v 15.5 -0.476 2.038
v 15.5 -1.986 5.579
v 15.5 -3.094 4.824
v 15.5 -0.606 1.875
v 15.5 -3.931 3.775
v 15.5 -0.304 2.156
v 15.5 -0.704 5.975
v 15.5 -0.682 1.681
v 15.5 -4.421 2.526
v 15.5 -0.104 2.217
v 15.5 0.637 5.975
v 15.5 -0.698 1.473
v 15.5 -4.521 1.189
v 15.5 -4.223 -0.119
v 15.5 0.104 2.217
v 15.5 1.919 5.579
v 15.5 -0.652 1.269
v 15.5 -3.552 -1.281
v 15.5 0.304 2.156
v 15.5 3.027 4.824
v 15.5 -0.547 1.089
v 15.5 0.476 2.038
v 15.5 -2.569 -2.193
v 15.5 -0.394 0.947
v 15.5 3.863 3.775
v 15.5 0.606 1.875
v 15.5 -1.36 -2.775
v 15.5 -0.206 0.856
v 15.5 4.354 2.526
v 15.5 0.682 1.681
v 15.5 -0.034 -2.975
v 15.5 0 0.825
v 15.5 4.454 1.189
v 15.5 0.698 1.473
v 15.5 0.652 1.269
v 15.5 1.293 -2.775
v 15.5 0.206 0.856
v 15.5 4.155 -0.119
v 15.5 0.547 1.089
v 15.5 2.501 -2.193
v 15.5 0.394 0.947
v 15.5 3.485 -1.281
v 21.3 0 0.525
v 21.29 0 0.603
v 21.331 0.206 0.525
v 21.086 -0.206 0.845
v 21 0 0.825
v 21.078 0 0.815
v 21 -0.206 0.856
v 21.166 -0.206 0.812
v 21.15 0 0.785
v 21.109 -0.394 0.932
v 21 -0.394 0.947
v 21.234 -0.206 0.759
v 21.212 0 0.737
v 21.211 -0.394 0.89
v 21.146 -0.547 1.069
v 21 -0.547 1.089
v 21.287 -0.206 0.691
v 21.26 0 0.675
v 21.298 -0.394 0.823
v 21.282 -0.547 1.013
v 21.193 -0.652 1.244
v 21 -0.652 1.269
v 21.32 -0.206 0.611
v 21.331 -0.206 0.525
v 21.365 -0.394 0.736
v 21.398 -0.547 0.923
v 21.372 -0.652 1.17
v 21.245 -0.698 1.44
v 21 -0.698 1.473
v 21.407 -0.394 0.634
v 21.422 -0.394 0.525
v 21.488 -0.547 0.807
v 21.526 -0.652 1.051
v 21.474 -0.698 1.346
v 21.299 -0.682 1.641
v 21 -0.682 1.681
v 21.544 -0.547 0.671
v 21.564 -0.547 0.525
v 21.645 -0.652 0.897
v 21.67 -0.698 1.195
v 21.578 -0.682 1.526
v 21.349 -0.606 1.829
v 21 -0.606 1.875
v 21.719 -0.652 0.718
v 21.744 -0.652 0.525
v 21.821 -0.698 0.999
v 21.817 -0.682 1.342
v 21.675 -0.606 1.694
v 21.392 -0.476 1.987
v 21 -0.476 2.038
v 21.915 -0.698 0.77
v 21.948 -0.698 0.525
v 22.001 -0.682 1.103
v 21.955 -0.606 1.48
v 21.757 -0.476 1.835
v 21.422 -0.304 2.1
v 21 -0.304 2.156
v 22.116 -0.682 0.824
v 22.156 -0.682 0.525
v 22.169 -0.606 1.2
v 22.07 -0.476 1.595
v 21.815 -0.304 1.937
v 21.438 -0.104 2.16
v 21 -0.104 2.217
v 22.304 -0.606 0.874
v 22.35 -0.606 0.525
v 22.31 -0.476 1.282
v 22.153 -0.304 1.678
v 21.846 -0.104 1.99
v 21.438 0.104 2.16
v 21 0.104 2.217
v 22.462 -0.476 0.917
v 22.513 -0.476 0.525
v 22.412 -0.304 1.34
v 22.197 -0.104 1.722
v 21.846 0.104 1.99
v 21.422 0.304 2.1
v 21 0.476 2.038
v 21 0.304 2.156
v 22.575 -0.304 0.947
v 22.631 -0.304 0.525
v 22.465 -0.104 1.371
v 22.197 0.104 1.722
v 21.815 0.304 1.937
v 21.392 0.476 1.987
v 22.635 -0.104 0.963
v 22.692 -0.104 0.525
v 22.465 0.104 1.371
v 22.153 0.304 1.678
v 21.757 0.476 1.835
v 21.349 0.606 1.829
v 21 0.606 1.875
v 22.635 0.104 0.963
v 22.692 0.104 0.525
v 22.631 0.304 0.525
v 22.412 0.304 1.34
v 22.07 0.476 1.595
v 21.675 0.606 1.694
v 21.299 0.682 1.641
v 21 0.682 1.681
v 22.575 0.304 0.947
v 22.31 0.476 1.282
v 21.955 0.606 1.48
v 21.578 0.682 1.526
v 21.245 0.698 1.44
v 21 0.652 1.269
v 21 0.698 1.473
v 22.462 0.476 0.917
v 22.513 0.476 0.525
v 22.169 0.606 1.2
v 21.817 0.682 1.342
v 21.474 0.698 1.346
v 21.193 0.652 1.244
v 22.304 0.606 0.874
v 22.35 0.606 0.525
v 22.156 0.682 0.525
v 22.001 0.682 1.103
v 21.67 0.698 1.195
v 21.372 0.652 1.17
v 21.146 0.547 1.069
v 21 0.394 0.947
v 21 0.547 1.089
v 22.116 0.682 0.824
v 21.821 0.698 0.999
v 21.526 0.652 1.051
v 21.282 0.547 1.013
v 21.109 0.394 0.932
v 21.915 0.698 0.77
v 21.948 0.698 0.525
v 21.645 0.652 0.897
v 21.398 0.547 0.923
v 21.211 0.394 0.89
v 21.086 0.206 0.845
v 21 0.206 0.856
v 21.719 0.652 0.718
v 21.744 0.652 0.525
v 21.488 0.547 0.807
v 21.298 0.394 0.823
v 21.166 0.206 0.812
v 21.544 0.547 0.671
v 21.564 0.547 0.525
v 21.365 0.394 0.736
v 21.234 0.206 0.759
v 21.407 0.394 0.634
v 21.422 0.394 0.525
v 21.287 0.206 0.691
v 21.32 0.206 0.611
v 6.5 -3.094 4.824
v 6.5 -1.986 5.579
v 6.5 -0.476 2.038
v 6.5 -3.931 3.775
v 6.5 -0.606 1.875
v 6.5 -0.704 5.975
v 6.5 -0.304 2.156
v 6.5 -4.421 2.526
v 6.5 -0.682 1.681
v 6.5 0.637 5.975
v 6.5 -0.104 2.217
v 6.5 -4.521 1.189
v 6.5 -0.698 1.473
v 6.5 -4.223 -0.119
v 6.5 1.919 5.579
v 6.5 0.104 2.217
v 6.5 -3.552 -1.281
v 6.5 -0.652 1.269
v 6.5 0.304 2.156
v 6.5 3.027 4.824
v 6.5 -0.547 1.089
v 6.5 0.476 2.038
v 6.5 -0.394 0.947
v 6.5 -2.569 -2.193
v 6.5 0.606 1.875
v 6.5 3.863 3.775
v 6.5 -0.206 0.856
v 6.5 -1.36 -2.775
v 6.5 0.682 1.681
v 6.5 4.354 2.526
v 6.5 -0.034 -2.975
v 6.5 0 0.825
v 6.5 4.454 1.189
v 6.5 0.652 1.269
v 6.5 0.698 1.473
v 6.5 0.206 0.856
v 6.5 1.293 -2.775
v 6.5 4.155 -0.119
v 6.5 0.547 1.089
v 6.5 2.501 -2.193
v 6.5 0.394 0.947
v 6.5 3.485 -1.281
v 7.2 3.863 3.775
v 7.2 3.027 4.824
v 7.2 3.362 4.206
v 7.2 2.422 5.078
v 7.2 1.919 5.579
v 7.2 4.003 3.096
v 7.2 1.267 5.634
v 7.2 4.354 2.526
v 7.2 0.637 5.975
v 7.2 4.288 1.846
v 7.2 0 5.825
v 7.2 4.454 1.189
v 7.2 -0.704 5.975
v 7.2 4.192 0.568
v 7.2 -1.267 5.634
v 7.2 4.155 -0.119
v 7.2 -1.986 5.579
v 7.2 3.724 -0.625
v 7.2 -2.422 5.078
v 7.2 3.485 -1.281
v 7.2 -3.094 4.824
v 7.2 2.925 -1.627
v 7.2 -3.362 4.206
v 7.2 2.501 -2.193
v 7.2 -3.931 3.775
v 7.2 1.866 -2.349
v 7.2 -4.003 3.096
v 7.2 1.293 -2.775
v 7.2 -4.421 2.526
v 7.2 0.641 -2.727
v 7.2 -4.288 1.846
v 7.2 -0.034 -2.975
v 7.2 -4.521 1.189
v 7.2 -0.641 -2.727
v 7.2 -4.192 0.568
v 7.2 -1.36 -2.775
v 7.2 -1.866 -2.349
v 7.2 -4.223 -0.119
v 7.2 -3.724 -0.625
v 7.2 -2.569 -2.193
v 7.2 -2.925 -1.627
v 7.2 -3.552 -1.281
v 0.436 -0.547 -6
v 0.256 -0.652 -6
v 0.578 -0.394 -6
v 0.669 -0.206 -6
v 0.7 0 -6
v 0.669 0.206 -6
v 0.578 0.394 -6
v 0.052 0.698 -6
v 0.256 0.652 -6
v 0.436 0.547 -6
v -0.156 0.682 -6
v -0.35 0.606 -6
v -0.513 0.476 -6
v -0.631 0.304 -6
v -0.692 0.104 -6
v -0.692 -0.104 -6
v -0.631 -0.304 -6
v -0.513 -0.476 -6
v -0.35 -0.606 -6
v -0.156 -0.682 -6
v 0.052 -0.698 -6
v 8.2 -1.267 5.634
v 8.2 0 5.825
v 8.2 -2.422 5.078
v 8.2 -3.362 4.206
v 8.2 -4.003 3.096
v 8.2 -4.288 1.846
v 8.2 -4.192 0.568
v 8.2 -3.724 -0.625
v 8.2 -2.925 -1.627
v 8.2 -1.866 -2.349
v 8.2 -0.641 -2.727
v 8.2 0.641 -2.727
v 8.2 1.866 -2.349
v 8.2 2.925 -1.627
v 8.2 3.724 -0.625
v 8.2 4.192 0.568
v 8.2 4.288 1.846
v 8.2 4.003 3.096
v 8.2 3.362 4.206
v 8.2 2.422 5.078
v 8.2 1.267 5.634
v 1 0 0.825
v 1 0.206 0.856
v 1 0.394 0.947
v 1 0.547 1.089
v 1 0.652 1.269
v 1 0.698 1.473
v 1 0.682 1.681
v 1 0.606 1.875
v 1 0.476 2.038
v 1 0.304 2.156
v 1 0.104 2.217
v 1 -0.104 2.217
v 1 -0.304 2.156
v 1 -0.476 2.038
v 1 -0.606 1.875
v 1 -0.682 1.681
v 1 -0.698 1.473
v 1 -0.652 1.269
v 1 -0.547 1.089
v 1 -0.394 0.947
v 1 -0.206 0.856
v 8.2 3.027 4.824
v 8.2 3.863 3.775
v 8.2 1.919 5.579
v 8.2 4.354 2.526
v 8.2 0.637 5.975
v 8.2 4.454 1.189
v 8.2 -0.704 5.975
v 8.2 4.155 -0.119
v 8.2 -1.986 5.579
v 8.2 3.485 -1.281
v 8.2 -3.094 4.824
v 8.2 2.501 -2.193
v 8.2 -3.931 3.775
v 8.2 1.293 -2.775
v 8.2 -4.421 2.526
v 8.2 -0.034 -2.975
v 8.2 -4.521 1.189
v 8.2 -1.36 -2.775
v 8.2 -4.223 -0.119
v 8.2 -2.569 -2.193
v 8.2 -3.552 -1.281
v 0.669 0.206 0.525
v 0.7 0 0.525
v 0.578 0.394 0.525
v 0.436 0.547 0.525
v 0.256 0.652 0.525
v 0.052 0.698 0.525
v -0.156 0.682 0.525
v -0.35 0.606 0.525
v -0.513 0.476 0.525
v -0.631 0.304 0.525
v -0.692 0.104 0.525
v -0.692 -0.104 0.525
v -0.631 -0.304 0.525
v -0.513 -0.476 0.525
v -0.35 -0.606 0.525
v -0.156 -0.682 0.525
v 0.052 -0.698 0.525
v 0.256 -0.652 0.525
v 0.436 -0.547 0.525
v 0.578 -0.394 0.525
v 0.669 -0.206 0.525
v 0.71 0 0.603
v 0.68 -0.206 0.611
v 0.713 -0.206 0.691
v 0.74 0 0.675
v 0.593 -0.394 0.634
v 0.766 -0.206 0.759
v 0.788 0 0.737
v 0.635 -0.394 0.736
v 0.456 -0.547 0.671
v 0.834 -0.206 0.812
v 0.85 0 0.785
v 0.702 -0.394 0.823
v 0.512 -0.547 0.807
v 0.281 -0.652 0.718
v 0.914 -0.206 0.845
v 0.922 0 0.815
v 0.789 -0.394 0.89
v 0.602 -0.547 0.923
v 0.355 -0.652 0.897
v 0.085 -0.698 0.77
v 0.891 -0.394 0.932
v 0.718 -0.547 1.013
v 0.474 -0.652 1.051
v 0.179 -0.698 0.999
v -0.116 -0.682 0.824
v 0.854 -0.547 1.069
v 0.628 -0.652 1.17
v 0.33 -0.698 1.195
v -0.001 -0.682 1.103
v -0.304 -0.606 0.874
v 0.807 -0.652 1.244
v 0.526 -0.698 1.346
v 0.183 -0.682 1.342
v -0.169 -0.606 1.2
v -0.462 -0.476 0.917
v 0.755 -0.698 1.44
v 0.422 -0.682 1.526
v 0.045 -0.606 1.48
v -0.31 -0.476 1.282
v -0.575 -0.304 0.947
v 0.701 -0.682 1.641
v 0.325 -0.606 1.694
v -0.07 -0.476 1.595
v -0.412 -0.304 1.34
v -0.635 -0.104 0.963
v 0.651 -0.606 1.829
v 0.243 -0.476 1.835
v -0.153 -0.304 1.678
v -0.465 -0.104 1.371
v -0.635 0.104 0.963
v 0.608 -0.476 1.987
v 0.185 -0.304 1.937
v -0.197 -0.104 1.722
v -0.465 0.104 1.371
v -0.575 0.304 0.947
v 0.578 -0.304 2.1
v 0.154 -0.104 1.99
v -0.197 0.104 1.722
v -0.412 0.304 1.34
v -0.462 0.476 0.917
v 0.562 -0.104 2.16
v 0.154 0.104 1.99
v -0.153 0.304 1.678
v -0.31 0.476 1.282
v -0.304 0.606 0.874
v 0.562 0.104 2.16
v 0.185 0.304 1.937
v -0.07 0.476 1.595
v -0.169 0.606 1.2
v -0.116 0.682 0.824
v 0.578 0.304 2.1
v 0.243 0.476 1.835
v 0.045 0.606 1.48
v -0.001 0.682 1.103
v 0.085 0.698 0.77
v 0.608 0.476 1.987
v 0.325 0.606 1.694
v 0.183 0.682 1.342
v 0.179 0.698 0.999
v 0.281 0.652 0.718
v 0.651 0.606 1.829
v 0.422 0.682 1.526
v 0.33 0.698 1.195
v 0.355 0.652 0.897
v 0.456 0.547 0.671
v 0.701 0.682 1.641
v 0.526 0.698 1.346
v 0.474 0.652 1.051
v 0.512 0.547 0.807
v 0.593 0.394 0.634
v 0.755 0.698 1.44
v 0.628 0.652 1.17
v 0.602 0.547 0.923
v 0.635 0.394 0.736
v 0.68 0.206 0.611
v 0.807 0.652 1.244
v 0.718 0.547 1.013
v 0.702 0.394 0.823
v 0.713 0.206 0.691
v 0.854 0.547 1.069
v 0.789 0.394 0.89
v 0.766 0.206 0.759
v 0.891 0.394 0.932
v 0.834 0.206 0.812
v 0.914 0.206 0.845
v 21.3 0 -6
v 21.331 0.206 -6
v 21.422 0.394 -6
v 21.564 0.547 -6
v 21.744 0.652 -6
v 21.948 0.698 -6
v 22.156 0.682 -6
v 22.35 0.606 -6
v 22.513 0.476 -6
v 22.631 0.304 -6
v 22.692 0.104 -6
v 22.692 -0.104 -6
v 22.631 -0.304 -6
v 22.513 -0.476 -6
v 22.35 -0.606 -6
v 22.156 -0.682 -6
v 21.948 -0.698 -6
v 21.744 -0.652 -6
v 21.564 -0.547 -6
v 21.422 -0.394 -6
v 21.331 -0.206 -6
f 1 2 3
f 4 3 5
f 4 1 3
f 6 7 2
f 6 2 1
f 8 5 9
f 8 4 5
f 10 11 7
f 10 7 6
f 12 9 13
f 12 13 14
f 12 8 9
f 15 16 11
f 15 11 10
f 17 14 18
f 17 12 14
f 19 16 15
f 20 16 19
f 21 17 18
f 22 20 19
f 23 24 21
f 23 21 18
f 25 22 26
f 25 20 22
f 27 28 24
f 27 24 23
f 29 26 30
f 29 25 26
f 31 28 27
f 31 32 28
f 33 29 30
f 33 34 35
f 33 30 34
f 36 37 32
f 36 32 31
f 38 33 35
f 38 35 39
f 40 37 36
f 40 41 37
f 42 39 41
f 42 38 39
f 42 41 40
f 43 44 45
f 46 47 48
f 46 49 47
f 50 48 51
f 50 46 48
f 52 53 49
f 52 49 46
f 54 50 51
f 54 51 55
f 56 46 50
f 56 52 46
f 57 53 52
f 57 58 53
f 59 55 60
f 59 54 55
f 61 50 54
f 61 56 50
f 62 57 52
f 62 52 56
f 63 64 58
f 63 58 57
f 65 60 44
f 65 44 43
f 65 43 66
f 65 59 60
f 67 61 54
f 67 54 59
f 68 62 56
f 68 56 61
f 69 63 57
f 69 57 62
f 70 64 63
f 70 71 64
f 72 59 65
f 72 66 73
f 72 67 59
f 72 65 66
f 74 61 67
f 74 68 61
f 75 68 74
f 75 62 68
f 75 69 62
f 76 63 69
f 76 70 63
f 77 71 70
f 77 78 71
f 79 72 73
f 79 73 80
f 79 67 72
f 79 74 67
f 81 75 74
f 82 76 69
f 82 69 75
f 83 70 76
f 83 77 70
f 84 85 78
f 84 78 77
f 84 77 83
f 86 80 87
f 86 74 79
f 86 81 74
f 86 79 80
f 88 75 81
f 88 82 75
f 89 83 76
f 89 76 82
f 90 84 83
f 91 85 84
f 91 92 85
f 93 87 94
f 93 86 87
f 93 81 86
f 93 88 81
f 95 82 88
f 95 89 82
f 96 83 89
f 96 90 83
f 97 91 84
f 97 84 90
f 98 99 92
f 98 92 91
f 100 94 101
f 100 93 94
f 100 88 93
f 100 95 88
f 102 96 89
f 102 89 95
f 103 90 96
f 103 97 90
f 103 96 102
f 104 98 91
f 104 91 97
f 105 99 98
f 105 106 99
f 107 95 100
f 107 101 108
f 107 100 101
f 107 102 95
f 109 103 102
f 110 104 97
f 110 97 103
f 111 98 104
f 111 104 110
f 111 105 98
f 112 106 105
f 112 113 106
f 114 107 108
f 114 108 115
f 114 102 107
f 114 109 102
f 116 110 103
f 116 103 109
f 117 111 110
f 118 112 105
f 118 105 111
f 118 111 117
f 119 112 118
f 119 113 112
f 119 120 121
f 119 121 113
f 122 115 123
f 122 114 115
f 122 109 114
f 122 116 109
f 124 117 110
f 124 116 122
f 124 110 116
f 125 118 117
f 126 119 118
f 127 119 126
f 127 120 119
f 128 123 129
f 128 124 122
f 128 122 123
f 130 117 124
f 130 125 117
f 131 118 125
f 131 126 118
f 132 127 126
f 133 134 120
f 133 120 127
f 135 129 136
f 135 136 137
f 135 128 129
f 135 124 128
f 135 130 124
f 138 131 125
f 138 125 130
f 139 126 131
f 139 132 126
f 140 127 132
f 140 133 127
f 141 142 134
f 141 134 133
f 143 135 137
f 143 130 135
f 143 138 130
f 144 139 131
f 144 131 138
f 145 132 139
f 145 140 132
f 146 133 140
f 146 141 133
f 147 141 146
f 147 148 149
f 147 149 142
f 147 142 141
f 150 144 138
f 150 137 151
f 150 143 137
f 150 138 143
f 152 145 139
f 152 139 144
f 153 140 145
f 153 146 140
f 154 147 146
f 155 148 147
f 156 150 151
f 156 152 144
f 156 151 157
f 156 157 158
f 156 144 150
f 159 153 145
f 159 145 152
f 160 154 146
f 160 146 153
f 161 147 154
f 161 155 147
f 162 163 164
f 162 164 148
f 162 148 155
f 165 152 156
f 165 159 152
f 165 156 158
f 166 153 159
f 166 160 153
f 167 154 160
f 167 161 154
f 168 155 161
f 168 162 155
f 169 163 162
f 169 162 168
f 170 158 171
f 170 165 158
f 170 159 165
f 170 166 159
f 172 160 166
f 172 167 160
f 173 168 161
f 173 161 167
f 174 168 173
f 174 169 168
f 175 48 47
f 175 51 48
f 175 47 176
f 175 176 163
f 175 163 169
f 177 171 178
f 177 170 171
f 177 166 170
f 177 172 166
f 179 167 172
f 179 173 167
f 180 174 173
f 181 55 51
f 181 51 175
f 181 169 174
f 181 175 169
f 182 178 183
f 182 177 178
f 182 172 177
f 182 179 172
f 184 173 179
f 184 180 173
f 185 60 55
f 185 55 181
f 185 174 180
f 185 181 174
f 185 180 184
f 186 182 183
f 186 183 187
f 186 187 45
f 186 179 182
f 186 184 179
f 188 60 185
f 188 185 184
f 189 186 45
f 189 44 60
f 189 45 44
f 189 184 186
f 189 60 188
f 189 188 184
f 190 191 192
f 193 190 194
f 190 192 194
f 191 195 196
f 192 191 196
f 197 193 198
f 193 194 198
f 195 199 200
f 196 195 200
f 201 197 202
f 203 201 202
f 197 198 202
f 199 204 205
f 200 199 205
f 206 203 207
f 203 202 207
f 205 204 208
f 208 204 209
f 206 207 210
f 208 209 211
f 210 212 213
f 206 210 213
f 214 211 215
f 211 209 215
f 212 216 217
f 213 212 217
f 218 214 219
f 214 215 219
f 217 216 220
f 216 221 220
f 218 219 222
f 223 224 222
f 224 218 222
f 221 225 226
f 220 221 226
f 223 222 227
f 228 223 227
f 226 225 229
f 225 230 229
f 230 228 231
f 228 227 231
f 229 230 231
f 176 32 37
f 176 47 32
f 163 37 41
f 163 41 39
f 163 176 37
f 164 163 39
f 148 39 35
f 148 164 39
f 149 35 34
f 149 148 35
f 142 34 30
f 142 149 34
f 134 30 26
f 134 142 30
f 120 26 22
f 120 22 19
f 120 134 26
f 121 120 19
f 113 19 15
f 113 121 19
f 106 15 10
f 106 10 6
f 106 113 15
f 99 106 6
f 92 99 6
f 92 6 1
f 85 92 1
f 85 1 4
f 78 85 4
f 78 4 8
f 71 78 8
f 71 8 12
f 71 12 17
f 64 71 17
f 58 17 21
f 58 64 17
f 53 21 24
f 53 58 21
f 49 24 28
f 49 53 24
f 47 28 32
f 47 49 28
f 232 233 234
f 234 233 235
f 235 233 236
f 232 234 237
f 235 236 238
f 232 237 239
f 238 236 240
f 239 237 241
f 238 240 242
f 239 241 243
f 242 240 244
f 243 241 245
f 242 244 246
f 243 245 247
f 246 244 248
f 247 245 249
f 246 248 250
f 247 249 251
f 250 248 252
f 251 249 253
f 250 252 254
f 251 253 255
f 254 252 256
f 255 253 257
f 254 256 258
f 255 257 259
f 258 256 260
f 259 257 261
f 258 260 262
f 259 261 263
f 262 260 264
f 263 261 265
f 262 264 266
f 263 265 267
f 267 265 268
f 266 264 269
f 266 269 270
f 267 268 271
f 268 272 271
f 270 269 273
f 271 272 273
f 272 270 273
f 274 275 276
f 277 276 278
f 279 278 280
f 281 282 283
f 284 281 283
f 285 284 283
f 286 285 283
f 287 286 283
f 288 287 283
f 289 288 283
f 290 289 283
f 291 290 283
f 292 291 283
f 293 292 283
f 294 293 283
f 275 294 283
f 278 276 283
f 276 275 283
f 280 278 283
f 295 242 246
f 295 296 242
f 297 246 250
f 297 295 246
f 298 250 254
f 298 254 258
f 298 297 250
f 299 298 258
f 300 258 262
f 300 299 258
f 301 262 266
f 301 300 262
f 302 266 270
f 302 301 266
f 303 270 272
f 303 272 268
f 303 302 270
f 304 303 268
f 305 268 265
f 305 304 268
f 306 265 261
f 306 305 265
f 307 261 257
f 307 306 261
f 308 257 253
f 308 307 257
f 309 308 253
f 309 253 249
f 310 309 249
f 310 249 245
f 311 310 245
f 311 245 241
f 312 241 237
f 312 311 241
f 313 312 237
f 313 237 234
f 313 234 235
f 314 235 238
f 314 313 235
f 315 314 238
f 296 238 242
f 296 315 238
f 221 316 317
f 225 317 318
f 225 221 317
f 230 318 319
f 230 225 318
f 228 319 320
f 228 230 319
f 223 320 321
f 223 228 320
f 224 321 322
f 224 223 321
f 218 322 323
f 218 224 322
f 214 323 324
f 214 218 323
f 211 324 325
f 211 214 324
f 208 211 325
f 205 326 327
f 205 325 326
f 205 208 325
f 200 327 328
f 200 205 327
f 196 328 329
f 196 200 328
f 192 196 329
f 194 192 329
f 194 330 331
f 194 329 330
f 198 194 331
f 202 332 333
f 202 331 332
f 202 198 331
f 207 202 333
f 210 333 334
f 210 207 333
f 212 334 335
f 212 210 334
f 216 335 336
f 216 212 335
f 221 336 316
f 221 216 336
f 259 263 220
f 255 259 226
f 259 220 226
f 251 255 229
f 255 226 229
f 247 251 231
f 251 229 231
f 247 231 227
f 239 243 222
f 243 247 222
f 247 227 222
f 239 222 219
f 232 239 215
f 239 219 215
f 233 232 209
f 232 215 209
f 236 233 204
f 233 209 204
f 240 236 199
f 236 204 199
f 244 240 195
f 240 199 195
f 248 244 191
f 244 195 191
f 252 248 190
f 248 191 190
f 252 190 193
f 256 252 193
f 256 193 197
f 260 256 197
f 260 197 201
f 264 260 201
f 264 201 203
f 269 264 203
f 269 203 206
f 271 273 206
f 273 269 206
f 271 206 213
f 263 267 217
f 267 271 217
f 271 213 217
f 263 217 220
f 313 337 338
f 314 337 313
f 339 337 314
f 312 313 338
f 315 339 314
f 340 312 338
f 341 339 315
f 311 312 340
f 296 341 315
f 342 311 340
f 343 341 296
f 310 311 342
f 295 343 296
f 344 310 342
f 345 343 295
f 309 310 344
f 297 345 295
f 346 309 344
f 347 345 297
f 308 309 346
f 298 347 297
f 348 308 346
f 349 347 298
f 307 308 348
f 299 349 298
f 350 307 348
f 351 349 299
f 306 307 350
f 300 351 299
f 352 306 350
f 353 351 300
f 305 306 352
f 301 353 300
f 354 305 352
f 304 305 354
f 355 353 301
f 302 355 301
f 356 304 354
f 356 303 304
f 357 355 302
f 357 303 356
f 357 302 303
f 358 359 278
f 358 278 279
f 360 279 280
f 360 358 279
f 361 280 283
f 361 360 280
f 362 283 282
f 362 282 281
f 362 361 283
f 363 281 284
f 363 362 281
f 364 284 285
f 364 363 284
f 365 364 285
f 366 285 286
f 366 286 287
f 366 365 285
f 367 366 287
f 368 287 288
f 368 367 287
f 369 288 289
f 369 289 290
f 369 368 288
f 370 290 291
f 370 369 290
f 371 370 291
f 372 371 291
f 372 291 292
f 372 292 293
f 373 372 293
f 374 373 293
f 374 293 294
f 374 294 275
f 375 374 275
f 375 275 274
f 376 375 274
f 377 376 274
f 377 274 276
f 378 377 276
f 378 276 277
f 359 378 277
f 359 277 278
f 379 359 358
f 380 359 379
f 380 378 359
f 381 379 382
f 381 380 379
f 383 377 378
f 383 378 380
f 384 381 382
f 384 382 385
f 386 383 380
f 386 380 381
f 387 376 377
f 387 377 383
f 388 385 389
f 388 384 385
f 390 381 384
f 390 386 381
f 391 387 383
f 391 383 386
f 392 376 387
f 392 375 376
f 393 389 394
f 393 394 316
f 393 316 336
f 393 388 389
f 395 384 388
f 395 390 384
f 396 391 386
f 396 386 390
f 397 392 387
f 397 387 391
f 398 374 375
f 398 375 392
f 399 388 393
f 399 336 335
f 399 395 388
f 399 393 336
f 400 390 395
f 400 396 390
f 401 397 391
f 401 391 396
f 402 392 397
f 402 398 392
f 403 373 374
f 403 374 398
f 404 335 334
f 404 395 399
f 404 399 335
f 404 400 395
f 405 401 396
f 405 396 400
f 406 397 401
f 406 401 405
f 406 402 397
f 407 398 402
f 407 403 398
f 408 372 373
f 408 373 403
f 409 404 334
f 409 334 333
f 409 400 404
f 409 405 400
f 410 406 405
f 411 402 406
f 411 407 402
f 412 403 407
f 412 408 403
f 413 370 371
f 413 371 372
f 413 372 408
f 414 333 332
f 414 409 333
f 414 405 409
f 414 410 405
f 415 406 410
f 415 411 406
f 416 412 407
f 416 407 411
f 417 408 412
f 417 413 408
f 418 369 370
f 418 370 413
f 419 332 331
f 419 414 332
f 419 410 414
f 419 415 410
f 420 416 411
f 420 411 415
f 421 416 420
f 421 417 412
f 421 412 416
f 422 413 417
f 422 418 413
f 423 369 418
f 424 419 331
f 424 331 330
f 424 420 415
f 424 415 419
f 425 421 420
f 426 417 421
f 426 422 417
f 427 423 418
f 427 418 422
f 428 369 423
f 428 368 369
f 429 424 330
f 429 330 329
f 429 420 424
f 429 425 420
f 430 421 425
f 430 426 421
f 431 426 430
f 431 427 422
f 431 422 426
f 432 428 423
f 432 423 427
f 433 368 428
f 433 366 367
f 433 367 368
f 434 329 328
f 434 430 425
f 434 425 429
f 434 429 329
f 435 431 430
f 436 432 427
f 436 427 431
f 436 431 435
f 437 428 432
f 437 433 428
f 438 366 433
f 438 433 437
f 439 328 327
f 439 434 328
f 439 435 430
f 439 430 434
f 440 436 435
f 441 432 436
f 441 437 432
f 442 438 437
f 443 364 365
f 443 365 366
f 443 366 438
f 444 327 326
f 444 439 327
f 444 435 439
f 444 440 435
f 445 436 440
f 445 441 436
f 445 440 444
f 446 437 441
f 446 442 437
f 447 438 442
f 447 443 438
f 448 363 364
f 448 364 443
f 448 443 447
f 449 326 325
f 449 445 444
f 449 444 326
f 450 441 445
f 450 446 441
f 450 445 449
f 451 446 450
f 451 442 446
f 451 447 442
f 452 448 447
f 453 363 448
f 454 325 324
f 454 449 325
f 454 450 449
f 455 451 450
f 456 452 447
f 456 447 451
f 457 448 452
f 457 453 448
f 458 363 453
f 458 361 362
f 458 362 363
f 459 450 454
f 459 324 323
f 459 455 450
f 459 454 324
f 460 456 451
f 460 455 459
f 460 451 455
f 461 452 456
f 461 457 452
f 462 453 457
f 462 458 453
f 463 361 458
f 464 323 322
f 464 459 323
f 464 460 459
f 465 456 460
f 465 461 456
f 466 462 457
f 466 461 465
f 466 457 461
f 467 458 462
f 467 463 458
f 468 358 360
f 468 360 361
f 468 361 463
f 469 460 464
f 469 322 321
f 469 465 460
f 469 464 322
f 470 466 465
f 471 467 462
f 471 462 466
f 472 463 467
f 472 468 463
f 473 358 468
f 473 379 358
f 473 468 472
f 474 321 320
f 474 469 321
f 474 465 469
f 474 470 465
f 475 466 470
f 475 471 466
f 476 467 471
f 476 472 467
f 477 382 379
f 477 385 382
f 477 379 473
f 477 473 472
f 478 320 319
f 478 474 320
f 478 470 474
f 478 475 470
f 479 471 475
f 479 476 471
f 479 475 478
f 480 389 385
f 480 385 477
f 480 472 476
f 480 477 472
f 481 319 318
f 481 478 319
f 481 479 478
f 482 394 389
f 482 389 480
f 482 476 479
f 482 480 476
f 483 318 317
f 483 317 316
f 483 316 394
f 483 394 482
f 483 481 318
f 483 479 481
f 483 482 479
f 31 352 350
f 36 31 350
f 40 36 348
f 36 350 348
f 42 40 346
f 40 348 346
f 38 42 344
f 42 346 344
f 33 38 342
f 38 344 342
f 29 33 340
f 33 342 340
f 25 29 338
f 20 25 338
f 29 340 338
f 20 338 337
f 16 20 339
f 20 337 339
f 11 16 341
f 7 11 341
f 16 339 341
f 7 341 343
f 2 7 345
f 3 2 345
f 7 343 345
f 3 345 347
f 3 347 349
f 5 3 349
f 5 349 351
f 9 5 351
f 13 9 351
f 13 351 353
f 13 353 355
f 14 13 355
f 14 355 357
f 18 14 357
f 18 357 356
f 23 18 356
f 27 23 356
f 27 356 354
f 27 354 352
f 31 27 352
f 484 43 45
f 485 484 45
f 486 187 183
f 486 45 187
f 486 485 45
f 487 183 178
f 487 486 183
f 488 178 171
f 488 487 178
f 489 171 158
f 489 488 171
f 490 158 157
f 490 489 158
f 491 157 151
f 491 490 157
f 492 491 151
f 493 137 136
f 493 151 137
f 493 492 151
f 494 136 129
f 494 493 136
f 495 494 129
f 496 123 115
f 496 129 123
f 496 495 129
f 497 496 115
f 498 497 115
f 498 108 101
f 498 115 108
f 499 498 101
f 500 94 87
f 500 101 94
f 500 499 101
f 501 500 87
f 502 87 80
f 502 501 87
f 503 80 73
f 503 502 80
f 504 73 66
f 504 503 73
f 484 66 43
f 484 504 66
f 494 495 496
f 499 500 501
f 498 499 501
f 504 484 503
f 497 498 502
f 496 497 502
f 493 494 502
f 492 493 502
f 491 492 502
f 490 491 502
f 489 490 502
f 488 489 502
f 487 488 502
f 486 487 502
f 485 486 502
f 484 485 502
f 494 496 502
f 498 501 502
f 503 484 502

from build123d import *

# Parameters (mm, degrees)
SKETCH_3_R        = 4.5
EXTRUDE_1_DEPTH   = 9
SKETCH_4_W        = 1
SKETCH_4_H        = 0.3
SKETCH_6_R        = 0.7
EXTRUDE_2_DEPTH   = 6
EXTRUDE_2_2_DEPTH = 6
SKETCH_7_R        = 0.7


with BuildPart() as part:
    # Эскиз3 → Вытянуть1 (new body)
    with BuildSketch(Plane(origin=(6.5, 0, 0), x_dir=(0, 0, -1), z_dir=(1, 0, 0))):
        with Locations((-1.525, -0.033649265)):
            Circle(SKETCH_3_R)
    extrude(amount=EXTRUDE_1_DEPTH)

    # Эскиз4 → Вырез-Повернуть1 (revolve, cut)
    with BuildSketch(Plane(origin=(0, 0, 0), x_dir=(1, 0, 0), z_dir=(0, 1, 0)), mode=Mode.PRIVATE) as cut_revolve_1_sk:
        with Locations((7.7, 2.925)):
            Rectangle(SKETCH_4_W, SKETCH_4_H)
    revolve(cut_revolve_1_sk.sketch.rotate(Axis((0, 0, 1.525), (1, 0, 0)), 180), axis=Axis((0, 0, 1.525), (1, 0, 0)), mode=Mode.SUBTRACT)



with BuildPart() as body_2:
    # Эскиз6 → Вытянуть2 (new body)
    with BuildSketch(Plane.XY):
        Circle(SKETCH_6_R)
    extrude(amount=-EXTRUDE_2_DEPTH)


with BuildPart() as body_3:
    # Эскиз6 → Extrude 2 2 (new body)
    with BuildSketch(Plane.XY):
        with Locations(Location((22, 0, 0), (0, 0, 180))):
            Circle(SKETCH_6_R)
    extrude(amount=-EXTRUDE_2_2_DEPTH)


with BuildPart() as part_1:
    add(part.part)

    add(body_2.part)  # По траектории1 merges body 2

    add(body_3.part)  # По траектории1 merges body 3
    # По траектории1: sweep along a path in Эскиз5
    with BuildLine(Plane(origin=(0, 0, 0), x_dir=(1, 0, 0), z_dir=(0, 1, 0))) as sweep_1_path:
        Line((0, 0), (0, -0.525))
        ThreePointArc((0, -0.525), (0.292893219, -1.232106781), (1, -1.525))
        Line((1, -1.525), (6.8, -1.525))
        Line((6.8, -1.525), (21, -1.525))
        ThreePointArc((21, -1.525), (21.707106781, -1.232106781), (22, -0.525))
        Line((22, -0.525), (22, 0))
    # Эскиз7 → По траектории1 (sweep)
    with BuildSketch(Plane.XY):
        Circle(SKETCH_7_R)
    sweep(path=sweep_1_path.line)


solid = part_1.part
